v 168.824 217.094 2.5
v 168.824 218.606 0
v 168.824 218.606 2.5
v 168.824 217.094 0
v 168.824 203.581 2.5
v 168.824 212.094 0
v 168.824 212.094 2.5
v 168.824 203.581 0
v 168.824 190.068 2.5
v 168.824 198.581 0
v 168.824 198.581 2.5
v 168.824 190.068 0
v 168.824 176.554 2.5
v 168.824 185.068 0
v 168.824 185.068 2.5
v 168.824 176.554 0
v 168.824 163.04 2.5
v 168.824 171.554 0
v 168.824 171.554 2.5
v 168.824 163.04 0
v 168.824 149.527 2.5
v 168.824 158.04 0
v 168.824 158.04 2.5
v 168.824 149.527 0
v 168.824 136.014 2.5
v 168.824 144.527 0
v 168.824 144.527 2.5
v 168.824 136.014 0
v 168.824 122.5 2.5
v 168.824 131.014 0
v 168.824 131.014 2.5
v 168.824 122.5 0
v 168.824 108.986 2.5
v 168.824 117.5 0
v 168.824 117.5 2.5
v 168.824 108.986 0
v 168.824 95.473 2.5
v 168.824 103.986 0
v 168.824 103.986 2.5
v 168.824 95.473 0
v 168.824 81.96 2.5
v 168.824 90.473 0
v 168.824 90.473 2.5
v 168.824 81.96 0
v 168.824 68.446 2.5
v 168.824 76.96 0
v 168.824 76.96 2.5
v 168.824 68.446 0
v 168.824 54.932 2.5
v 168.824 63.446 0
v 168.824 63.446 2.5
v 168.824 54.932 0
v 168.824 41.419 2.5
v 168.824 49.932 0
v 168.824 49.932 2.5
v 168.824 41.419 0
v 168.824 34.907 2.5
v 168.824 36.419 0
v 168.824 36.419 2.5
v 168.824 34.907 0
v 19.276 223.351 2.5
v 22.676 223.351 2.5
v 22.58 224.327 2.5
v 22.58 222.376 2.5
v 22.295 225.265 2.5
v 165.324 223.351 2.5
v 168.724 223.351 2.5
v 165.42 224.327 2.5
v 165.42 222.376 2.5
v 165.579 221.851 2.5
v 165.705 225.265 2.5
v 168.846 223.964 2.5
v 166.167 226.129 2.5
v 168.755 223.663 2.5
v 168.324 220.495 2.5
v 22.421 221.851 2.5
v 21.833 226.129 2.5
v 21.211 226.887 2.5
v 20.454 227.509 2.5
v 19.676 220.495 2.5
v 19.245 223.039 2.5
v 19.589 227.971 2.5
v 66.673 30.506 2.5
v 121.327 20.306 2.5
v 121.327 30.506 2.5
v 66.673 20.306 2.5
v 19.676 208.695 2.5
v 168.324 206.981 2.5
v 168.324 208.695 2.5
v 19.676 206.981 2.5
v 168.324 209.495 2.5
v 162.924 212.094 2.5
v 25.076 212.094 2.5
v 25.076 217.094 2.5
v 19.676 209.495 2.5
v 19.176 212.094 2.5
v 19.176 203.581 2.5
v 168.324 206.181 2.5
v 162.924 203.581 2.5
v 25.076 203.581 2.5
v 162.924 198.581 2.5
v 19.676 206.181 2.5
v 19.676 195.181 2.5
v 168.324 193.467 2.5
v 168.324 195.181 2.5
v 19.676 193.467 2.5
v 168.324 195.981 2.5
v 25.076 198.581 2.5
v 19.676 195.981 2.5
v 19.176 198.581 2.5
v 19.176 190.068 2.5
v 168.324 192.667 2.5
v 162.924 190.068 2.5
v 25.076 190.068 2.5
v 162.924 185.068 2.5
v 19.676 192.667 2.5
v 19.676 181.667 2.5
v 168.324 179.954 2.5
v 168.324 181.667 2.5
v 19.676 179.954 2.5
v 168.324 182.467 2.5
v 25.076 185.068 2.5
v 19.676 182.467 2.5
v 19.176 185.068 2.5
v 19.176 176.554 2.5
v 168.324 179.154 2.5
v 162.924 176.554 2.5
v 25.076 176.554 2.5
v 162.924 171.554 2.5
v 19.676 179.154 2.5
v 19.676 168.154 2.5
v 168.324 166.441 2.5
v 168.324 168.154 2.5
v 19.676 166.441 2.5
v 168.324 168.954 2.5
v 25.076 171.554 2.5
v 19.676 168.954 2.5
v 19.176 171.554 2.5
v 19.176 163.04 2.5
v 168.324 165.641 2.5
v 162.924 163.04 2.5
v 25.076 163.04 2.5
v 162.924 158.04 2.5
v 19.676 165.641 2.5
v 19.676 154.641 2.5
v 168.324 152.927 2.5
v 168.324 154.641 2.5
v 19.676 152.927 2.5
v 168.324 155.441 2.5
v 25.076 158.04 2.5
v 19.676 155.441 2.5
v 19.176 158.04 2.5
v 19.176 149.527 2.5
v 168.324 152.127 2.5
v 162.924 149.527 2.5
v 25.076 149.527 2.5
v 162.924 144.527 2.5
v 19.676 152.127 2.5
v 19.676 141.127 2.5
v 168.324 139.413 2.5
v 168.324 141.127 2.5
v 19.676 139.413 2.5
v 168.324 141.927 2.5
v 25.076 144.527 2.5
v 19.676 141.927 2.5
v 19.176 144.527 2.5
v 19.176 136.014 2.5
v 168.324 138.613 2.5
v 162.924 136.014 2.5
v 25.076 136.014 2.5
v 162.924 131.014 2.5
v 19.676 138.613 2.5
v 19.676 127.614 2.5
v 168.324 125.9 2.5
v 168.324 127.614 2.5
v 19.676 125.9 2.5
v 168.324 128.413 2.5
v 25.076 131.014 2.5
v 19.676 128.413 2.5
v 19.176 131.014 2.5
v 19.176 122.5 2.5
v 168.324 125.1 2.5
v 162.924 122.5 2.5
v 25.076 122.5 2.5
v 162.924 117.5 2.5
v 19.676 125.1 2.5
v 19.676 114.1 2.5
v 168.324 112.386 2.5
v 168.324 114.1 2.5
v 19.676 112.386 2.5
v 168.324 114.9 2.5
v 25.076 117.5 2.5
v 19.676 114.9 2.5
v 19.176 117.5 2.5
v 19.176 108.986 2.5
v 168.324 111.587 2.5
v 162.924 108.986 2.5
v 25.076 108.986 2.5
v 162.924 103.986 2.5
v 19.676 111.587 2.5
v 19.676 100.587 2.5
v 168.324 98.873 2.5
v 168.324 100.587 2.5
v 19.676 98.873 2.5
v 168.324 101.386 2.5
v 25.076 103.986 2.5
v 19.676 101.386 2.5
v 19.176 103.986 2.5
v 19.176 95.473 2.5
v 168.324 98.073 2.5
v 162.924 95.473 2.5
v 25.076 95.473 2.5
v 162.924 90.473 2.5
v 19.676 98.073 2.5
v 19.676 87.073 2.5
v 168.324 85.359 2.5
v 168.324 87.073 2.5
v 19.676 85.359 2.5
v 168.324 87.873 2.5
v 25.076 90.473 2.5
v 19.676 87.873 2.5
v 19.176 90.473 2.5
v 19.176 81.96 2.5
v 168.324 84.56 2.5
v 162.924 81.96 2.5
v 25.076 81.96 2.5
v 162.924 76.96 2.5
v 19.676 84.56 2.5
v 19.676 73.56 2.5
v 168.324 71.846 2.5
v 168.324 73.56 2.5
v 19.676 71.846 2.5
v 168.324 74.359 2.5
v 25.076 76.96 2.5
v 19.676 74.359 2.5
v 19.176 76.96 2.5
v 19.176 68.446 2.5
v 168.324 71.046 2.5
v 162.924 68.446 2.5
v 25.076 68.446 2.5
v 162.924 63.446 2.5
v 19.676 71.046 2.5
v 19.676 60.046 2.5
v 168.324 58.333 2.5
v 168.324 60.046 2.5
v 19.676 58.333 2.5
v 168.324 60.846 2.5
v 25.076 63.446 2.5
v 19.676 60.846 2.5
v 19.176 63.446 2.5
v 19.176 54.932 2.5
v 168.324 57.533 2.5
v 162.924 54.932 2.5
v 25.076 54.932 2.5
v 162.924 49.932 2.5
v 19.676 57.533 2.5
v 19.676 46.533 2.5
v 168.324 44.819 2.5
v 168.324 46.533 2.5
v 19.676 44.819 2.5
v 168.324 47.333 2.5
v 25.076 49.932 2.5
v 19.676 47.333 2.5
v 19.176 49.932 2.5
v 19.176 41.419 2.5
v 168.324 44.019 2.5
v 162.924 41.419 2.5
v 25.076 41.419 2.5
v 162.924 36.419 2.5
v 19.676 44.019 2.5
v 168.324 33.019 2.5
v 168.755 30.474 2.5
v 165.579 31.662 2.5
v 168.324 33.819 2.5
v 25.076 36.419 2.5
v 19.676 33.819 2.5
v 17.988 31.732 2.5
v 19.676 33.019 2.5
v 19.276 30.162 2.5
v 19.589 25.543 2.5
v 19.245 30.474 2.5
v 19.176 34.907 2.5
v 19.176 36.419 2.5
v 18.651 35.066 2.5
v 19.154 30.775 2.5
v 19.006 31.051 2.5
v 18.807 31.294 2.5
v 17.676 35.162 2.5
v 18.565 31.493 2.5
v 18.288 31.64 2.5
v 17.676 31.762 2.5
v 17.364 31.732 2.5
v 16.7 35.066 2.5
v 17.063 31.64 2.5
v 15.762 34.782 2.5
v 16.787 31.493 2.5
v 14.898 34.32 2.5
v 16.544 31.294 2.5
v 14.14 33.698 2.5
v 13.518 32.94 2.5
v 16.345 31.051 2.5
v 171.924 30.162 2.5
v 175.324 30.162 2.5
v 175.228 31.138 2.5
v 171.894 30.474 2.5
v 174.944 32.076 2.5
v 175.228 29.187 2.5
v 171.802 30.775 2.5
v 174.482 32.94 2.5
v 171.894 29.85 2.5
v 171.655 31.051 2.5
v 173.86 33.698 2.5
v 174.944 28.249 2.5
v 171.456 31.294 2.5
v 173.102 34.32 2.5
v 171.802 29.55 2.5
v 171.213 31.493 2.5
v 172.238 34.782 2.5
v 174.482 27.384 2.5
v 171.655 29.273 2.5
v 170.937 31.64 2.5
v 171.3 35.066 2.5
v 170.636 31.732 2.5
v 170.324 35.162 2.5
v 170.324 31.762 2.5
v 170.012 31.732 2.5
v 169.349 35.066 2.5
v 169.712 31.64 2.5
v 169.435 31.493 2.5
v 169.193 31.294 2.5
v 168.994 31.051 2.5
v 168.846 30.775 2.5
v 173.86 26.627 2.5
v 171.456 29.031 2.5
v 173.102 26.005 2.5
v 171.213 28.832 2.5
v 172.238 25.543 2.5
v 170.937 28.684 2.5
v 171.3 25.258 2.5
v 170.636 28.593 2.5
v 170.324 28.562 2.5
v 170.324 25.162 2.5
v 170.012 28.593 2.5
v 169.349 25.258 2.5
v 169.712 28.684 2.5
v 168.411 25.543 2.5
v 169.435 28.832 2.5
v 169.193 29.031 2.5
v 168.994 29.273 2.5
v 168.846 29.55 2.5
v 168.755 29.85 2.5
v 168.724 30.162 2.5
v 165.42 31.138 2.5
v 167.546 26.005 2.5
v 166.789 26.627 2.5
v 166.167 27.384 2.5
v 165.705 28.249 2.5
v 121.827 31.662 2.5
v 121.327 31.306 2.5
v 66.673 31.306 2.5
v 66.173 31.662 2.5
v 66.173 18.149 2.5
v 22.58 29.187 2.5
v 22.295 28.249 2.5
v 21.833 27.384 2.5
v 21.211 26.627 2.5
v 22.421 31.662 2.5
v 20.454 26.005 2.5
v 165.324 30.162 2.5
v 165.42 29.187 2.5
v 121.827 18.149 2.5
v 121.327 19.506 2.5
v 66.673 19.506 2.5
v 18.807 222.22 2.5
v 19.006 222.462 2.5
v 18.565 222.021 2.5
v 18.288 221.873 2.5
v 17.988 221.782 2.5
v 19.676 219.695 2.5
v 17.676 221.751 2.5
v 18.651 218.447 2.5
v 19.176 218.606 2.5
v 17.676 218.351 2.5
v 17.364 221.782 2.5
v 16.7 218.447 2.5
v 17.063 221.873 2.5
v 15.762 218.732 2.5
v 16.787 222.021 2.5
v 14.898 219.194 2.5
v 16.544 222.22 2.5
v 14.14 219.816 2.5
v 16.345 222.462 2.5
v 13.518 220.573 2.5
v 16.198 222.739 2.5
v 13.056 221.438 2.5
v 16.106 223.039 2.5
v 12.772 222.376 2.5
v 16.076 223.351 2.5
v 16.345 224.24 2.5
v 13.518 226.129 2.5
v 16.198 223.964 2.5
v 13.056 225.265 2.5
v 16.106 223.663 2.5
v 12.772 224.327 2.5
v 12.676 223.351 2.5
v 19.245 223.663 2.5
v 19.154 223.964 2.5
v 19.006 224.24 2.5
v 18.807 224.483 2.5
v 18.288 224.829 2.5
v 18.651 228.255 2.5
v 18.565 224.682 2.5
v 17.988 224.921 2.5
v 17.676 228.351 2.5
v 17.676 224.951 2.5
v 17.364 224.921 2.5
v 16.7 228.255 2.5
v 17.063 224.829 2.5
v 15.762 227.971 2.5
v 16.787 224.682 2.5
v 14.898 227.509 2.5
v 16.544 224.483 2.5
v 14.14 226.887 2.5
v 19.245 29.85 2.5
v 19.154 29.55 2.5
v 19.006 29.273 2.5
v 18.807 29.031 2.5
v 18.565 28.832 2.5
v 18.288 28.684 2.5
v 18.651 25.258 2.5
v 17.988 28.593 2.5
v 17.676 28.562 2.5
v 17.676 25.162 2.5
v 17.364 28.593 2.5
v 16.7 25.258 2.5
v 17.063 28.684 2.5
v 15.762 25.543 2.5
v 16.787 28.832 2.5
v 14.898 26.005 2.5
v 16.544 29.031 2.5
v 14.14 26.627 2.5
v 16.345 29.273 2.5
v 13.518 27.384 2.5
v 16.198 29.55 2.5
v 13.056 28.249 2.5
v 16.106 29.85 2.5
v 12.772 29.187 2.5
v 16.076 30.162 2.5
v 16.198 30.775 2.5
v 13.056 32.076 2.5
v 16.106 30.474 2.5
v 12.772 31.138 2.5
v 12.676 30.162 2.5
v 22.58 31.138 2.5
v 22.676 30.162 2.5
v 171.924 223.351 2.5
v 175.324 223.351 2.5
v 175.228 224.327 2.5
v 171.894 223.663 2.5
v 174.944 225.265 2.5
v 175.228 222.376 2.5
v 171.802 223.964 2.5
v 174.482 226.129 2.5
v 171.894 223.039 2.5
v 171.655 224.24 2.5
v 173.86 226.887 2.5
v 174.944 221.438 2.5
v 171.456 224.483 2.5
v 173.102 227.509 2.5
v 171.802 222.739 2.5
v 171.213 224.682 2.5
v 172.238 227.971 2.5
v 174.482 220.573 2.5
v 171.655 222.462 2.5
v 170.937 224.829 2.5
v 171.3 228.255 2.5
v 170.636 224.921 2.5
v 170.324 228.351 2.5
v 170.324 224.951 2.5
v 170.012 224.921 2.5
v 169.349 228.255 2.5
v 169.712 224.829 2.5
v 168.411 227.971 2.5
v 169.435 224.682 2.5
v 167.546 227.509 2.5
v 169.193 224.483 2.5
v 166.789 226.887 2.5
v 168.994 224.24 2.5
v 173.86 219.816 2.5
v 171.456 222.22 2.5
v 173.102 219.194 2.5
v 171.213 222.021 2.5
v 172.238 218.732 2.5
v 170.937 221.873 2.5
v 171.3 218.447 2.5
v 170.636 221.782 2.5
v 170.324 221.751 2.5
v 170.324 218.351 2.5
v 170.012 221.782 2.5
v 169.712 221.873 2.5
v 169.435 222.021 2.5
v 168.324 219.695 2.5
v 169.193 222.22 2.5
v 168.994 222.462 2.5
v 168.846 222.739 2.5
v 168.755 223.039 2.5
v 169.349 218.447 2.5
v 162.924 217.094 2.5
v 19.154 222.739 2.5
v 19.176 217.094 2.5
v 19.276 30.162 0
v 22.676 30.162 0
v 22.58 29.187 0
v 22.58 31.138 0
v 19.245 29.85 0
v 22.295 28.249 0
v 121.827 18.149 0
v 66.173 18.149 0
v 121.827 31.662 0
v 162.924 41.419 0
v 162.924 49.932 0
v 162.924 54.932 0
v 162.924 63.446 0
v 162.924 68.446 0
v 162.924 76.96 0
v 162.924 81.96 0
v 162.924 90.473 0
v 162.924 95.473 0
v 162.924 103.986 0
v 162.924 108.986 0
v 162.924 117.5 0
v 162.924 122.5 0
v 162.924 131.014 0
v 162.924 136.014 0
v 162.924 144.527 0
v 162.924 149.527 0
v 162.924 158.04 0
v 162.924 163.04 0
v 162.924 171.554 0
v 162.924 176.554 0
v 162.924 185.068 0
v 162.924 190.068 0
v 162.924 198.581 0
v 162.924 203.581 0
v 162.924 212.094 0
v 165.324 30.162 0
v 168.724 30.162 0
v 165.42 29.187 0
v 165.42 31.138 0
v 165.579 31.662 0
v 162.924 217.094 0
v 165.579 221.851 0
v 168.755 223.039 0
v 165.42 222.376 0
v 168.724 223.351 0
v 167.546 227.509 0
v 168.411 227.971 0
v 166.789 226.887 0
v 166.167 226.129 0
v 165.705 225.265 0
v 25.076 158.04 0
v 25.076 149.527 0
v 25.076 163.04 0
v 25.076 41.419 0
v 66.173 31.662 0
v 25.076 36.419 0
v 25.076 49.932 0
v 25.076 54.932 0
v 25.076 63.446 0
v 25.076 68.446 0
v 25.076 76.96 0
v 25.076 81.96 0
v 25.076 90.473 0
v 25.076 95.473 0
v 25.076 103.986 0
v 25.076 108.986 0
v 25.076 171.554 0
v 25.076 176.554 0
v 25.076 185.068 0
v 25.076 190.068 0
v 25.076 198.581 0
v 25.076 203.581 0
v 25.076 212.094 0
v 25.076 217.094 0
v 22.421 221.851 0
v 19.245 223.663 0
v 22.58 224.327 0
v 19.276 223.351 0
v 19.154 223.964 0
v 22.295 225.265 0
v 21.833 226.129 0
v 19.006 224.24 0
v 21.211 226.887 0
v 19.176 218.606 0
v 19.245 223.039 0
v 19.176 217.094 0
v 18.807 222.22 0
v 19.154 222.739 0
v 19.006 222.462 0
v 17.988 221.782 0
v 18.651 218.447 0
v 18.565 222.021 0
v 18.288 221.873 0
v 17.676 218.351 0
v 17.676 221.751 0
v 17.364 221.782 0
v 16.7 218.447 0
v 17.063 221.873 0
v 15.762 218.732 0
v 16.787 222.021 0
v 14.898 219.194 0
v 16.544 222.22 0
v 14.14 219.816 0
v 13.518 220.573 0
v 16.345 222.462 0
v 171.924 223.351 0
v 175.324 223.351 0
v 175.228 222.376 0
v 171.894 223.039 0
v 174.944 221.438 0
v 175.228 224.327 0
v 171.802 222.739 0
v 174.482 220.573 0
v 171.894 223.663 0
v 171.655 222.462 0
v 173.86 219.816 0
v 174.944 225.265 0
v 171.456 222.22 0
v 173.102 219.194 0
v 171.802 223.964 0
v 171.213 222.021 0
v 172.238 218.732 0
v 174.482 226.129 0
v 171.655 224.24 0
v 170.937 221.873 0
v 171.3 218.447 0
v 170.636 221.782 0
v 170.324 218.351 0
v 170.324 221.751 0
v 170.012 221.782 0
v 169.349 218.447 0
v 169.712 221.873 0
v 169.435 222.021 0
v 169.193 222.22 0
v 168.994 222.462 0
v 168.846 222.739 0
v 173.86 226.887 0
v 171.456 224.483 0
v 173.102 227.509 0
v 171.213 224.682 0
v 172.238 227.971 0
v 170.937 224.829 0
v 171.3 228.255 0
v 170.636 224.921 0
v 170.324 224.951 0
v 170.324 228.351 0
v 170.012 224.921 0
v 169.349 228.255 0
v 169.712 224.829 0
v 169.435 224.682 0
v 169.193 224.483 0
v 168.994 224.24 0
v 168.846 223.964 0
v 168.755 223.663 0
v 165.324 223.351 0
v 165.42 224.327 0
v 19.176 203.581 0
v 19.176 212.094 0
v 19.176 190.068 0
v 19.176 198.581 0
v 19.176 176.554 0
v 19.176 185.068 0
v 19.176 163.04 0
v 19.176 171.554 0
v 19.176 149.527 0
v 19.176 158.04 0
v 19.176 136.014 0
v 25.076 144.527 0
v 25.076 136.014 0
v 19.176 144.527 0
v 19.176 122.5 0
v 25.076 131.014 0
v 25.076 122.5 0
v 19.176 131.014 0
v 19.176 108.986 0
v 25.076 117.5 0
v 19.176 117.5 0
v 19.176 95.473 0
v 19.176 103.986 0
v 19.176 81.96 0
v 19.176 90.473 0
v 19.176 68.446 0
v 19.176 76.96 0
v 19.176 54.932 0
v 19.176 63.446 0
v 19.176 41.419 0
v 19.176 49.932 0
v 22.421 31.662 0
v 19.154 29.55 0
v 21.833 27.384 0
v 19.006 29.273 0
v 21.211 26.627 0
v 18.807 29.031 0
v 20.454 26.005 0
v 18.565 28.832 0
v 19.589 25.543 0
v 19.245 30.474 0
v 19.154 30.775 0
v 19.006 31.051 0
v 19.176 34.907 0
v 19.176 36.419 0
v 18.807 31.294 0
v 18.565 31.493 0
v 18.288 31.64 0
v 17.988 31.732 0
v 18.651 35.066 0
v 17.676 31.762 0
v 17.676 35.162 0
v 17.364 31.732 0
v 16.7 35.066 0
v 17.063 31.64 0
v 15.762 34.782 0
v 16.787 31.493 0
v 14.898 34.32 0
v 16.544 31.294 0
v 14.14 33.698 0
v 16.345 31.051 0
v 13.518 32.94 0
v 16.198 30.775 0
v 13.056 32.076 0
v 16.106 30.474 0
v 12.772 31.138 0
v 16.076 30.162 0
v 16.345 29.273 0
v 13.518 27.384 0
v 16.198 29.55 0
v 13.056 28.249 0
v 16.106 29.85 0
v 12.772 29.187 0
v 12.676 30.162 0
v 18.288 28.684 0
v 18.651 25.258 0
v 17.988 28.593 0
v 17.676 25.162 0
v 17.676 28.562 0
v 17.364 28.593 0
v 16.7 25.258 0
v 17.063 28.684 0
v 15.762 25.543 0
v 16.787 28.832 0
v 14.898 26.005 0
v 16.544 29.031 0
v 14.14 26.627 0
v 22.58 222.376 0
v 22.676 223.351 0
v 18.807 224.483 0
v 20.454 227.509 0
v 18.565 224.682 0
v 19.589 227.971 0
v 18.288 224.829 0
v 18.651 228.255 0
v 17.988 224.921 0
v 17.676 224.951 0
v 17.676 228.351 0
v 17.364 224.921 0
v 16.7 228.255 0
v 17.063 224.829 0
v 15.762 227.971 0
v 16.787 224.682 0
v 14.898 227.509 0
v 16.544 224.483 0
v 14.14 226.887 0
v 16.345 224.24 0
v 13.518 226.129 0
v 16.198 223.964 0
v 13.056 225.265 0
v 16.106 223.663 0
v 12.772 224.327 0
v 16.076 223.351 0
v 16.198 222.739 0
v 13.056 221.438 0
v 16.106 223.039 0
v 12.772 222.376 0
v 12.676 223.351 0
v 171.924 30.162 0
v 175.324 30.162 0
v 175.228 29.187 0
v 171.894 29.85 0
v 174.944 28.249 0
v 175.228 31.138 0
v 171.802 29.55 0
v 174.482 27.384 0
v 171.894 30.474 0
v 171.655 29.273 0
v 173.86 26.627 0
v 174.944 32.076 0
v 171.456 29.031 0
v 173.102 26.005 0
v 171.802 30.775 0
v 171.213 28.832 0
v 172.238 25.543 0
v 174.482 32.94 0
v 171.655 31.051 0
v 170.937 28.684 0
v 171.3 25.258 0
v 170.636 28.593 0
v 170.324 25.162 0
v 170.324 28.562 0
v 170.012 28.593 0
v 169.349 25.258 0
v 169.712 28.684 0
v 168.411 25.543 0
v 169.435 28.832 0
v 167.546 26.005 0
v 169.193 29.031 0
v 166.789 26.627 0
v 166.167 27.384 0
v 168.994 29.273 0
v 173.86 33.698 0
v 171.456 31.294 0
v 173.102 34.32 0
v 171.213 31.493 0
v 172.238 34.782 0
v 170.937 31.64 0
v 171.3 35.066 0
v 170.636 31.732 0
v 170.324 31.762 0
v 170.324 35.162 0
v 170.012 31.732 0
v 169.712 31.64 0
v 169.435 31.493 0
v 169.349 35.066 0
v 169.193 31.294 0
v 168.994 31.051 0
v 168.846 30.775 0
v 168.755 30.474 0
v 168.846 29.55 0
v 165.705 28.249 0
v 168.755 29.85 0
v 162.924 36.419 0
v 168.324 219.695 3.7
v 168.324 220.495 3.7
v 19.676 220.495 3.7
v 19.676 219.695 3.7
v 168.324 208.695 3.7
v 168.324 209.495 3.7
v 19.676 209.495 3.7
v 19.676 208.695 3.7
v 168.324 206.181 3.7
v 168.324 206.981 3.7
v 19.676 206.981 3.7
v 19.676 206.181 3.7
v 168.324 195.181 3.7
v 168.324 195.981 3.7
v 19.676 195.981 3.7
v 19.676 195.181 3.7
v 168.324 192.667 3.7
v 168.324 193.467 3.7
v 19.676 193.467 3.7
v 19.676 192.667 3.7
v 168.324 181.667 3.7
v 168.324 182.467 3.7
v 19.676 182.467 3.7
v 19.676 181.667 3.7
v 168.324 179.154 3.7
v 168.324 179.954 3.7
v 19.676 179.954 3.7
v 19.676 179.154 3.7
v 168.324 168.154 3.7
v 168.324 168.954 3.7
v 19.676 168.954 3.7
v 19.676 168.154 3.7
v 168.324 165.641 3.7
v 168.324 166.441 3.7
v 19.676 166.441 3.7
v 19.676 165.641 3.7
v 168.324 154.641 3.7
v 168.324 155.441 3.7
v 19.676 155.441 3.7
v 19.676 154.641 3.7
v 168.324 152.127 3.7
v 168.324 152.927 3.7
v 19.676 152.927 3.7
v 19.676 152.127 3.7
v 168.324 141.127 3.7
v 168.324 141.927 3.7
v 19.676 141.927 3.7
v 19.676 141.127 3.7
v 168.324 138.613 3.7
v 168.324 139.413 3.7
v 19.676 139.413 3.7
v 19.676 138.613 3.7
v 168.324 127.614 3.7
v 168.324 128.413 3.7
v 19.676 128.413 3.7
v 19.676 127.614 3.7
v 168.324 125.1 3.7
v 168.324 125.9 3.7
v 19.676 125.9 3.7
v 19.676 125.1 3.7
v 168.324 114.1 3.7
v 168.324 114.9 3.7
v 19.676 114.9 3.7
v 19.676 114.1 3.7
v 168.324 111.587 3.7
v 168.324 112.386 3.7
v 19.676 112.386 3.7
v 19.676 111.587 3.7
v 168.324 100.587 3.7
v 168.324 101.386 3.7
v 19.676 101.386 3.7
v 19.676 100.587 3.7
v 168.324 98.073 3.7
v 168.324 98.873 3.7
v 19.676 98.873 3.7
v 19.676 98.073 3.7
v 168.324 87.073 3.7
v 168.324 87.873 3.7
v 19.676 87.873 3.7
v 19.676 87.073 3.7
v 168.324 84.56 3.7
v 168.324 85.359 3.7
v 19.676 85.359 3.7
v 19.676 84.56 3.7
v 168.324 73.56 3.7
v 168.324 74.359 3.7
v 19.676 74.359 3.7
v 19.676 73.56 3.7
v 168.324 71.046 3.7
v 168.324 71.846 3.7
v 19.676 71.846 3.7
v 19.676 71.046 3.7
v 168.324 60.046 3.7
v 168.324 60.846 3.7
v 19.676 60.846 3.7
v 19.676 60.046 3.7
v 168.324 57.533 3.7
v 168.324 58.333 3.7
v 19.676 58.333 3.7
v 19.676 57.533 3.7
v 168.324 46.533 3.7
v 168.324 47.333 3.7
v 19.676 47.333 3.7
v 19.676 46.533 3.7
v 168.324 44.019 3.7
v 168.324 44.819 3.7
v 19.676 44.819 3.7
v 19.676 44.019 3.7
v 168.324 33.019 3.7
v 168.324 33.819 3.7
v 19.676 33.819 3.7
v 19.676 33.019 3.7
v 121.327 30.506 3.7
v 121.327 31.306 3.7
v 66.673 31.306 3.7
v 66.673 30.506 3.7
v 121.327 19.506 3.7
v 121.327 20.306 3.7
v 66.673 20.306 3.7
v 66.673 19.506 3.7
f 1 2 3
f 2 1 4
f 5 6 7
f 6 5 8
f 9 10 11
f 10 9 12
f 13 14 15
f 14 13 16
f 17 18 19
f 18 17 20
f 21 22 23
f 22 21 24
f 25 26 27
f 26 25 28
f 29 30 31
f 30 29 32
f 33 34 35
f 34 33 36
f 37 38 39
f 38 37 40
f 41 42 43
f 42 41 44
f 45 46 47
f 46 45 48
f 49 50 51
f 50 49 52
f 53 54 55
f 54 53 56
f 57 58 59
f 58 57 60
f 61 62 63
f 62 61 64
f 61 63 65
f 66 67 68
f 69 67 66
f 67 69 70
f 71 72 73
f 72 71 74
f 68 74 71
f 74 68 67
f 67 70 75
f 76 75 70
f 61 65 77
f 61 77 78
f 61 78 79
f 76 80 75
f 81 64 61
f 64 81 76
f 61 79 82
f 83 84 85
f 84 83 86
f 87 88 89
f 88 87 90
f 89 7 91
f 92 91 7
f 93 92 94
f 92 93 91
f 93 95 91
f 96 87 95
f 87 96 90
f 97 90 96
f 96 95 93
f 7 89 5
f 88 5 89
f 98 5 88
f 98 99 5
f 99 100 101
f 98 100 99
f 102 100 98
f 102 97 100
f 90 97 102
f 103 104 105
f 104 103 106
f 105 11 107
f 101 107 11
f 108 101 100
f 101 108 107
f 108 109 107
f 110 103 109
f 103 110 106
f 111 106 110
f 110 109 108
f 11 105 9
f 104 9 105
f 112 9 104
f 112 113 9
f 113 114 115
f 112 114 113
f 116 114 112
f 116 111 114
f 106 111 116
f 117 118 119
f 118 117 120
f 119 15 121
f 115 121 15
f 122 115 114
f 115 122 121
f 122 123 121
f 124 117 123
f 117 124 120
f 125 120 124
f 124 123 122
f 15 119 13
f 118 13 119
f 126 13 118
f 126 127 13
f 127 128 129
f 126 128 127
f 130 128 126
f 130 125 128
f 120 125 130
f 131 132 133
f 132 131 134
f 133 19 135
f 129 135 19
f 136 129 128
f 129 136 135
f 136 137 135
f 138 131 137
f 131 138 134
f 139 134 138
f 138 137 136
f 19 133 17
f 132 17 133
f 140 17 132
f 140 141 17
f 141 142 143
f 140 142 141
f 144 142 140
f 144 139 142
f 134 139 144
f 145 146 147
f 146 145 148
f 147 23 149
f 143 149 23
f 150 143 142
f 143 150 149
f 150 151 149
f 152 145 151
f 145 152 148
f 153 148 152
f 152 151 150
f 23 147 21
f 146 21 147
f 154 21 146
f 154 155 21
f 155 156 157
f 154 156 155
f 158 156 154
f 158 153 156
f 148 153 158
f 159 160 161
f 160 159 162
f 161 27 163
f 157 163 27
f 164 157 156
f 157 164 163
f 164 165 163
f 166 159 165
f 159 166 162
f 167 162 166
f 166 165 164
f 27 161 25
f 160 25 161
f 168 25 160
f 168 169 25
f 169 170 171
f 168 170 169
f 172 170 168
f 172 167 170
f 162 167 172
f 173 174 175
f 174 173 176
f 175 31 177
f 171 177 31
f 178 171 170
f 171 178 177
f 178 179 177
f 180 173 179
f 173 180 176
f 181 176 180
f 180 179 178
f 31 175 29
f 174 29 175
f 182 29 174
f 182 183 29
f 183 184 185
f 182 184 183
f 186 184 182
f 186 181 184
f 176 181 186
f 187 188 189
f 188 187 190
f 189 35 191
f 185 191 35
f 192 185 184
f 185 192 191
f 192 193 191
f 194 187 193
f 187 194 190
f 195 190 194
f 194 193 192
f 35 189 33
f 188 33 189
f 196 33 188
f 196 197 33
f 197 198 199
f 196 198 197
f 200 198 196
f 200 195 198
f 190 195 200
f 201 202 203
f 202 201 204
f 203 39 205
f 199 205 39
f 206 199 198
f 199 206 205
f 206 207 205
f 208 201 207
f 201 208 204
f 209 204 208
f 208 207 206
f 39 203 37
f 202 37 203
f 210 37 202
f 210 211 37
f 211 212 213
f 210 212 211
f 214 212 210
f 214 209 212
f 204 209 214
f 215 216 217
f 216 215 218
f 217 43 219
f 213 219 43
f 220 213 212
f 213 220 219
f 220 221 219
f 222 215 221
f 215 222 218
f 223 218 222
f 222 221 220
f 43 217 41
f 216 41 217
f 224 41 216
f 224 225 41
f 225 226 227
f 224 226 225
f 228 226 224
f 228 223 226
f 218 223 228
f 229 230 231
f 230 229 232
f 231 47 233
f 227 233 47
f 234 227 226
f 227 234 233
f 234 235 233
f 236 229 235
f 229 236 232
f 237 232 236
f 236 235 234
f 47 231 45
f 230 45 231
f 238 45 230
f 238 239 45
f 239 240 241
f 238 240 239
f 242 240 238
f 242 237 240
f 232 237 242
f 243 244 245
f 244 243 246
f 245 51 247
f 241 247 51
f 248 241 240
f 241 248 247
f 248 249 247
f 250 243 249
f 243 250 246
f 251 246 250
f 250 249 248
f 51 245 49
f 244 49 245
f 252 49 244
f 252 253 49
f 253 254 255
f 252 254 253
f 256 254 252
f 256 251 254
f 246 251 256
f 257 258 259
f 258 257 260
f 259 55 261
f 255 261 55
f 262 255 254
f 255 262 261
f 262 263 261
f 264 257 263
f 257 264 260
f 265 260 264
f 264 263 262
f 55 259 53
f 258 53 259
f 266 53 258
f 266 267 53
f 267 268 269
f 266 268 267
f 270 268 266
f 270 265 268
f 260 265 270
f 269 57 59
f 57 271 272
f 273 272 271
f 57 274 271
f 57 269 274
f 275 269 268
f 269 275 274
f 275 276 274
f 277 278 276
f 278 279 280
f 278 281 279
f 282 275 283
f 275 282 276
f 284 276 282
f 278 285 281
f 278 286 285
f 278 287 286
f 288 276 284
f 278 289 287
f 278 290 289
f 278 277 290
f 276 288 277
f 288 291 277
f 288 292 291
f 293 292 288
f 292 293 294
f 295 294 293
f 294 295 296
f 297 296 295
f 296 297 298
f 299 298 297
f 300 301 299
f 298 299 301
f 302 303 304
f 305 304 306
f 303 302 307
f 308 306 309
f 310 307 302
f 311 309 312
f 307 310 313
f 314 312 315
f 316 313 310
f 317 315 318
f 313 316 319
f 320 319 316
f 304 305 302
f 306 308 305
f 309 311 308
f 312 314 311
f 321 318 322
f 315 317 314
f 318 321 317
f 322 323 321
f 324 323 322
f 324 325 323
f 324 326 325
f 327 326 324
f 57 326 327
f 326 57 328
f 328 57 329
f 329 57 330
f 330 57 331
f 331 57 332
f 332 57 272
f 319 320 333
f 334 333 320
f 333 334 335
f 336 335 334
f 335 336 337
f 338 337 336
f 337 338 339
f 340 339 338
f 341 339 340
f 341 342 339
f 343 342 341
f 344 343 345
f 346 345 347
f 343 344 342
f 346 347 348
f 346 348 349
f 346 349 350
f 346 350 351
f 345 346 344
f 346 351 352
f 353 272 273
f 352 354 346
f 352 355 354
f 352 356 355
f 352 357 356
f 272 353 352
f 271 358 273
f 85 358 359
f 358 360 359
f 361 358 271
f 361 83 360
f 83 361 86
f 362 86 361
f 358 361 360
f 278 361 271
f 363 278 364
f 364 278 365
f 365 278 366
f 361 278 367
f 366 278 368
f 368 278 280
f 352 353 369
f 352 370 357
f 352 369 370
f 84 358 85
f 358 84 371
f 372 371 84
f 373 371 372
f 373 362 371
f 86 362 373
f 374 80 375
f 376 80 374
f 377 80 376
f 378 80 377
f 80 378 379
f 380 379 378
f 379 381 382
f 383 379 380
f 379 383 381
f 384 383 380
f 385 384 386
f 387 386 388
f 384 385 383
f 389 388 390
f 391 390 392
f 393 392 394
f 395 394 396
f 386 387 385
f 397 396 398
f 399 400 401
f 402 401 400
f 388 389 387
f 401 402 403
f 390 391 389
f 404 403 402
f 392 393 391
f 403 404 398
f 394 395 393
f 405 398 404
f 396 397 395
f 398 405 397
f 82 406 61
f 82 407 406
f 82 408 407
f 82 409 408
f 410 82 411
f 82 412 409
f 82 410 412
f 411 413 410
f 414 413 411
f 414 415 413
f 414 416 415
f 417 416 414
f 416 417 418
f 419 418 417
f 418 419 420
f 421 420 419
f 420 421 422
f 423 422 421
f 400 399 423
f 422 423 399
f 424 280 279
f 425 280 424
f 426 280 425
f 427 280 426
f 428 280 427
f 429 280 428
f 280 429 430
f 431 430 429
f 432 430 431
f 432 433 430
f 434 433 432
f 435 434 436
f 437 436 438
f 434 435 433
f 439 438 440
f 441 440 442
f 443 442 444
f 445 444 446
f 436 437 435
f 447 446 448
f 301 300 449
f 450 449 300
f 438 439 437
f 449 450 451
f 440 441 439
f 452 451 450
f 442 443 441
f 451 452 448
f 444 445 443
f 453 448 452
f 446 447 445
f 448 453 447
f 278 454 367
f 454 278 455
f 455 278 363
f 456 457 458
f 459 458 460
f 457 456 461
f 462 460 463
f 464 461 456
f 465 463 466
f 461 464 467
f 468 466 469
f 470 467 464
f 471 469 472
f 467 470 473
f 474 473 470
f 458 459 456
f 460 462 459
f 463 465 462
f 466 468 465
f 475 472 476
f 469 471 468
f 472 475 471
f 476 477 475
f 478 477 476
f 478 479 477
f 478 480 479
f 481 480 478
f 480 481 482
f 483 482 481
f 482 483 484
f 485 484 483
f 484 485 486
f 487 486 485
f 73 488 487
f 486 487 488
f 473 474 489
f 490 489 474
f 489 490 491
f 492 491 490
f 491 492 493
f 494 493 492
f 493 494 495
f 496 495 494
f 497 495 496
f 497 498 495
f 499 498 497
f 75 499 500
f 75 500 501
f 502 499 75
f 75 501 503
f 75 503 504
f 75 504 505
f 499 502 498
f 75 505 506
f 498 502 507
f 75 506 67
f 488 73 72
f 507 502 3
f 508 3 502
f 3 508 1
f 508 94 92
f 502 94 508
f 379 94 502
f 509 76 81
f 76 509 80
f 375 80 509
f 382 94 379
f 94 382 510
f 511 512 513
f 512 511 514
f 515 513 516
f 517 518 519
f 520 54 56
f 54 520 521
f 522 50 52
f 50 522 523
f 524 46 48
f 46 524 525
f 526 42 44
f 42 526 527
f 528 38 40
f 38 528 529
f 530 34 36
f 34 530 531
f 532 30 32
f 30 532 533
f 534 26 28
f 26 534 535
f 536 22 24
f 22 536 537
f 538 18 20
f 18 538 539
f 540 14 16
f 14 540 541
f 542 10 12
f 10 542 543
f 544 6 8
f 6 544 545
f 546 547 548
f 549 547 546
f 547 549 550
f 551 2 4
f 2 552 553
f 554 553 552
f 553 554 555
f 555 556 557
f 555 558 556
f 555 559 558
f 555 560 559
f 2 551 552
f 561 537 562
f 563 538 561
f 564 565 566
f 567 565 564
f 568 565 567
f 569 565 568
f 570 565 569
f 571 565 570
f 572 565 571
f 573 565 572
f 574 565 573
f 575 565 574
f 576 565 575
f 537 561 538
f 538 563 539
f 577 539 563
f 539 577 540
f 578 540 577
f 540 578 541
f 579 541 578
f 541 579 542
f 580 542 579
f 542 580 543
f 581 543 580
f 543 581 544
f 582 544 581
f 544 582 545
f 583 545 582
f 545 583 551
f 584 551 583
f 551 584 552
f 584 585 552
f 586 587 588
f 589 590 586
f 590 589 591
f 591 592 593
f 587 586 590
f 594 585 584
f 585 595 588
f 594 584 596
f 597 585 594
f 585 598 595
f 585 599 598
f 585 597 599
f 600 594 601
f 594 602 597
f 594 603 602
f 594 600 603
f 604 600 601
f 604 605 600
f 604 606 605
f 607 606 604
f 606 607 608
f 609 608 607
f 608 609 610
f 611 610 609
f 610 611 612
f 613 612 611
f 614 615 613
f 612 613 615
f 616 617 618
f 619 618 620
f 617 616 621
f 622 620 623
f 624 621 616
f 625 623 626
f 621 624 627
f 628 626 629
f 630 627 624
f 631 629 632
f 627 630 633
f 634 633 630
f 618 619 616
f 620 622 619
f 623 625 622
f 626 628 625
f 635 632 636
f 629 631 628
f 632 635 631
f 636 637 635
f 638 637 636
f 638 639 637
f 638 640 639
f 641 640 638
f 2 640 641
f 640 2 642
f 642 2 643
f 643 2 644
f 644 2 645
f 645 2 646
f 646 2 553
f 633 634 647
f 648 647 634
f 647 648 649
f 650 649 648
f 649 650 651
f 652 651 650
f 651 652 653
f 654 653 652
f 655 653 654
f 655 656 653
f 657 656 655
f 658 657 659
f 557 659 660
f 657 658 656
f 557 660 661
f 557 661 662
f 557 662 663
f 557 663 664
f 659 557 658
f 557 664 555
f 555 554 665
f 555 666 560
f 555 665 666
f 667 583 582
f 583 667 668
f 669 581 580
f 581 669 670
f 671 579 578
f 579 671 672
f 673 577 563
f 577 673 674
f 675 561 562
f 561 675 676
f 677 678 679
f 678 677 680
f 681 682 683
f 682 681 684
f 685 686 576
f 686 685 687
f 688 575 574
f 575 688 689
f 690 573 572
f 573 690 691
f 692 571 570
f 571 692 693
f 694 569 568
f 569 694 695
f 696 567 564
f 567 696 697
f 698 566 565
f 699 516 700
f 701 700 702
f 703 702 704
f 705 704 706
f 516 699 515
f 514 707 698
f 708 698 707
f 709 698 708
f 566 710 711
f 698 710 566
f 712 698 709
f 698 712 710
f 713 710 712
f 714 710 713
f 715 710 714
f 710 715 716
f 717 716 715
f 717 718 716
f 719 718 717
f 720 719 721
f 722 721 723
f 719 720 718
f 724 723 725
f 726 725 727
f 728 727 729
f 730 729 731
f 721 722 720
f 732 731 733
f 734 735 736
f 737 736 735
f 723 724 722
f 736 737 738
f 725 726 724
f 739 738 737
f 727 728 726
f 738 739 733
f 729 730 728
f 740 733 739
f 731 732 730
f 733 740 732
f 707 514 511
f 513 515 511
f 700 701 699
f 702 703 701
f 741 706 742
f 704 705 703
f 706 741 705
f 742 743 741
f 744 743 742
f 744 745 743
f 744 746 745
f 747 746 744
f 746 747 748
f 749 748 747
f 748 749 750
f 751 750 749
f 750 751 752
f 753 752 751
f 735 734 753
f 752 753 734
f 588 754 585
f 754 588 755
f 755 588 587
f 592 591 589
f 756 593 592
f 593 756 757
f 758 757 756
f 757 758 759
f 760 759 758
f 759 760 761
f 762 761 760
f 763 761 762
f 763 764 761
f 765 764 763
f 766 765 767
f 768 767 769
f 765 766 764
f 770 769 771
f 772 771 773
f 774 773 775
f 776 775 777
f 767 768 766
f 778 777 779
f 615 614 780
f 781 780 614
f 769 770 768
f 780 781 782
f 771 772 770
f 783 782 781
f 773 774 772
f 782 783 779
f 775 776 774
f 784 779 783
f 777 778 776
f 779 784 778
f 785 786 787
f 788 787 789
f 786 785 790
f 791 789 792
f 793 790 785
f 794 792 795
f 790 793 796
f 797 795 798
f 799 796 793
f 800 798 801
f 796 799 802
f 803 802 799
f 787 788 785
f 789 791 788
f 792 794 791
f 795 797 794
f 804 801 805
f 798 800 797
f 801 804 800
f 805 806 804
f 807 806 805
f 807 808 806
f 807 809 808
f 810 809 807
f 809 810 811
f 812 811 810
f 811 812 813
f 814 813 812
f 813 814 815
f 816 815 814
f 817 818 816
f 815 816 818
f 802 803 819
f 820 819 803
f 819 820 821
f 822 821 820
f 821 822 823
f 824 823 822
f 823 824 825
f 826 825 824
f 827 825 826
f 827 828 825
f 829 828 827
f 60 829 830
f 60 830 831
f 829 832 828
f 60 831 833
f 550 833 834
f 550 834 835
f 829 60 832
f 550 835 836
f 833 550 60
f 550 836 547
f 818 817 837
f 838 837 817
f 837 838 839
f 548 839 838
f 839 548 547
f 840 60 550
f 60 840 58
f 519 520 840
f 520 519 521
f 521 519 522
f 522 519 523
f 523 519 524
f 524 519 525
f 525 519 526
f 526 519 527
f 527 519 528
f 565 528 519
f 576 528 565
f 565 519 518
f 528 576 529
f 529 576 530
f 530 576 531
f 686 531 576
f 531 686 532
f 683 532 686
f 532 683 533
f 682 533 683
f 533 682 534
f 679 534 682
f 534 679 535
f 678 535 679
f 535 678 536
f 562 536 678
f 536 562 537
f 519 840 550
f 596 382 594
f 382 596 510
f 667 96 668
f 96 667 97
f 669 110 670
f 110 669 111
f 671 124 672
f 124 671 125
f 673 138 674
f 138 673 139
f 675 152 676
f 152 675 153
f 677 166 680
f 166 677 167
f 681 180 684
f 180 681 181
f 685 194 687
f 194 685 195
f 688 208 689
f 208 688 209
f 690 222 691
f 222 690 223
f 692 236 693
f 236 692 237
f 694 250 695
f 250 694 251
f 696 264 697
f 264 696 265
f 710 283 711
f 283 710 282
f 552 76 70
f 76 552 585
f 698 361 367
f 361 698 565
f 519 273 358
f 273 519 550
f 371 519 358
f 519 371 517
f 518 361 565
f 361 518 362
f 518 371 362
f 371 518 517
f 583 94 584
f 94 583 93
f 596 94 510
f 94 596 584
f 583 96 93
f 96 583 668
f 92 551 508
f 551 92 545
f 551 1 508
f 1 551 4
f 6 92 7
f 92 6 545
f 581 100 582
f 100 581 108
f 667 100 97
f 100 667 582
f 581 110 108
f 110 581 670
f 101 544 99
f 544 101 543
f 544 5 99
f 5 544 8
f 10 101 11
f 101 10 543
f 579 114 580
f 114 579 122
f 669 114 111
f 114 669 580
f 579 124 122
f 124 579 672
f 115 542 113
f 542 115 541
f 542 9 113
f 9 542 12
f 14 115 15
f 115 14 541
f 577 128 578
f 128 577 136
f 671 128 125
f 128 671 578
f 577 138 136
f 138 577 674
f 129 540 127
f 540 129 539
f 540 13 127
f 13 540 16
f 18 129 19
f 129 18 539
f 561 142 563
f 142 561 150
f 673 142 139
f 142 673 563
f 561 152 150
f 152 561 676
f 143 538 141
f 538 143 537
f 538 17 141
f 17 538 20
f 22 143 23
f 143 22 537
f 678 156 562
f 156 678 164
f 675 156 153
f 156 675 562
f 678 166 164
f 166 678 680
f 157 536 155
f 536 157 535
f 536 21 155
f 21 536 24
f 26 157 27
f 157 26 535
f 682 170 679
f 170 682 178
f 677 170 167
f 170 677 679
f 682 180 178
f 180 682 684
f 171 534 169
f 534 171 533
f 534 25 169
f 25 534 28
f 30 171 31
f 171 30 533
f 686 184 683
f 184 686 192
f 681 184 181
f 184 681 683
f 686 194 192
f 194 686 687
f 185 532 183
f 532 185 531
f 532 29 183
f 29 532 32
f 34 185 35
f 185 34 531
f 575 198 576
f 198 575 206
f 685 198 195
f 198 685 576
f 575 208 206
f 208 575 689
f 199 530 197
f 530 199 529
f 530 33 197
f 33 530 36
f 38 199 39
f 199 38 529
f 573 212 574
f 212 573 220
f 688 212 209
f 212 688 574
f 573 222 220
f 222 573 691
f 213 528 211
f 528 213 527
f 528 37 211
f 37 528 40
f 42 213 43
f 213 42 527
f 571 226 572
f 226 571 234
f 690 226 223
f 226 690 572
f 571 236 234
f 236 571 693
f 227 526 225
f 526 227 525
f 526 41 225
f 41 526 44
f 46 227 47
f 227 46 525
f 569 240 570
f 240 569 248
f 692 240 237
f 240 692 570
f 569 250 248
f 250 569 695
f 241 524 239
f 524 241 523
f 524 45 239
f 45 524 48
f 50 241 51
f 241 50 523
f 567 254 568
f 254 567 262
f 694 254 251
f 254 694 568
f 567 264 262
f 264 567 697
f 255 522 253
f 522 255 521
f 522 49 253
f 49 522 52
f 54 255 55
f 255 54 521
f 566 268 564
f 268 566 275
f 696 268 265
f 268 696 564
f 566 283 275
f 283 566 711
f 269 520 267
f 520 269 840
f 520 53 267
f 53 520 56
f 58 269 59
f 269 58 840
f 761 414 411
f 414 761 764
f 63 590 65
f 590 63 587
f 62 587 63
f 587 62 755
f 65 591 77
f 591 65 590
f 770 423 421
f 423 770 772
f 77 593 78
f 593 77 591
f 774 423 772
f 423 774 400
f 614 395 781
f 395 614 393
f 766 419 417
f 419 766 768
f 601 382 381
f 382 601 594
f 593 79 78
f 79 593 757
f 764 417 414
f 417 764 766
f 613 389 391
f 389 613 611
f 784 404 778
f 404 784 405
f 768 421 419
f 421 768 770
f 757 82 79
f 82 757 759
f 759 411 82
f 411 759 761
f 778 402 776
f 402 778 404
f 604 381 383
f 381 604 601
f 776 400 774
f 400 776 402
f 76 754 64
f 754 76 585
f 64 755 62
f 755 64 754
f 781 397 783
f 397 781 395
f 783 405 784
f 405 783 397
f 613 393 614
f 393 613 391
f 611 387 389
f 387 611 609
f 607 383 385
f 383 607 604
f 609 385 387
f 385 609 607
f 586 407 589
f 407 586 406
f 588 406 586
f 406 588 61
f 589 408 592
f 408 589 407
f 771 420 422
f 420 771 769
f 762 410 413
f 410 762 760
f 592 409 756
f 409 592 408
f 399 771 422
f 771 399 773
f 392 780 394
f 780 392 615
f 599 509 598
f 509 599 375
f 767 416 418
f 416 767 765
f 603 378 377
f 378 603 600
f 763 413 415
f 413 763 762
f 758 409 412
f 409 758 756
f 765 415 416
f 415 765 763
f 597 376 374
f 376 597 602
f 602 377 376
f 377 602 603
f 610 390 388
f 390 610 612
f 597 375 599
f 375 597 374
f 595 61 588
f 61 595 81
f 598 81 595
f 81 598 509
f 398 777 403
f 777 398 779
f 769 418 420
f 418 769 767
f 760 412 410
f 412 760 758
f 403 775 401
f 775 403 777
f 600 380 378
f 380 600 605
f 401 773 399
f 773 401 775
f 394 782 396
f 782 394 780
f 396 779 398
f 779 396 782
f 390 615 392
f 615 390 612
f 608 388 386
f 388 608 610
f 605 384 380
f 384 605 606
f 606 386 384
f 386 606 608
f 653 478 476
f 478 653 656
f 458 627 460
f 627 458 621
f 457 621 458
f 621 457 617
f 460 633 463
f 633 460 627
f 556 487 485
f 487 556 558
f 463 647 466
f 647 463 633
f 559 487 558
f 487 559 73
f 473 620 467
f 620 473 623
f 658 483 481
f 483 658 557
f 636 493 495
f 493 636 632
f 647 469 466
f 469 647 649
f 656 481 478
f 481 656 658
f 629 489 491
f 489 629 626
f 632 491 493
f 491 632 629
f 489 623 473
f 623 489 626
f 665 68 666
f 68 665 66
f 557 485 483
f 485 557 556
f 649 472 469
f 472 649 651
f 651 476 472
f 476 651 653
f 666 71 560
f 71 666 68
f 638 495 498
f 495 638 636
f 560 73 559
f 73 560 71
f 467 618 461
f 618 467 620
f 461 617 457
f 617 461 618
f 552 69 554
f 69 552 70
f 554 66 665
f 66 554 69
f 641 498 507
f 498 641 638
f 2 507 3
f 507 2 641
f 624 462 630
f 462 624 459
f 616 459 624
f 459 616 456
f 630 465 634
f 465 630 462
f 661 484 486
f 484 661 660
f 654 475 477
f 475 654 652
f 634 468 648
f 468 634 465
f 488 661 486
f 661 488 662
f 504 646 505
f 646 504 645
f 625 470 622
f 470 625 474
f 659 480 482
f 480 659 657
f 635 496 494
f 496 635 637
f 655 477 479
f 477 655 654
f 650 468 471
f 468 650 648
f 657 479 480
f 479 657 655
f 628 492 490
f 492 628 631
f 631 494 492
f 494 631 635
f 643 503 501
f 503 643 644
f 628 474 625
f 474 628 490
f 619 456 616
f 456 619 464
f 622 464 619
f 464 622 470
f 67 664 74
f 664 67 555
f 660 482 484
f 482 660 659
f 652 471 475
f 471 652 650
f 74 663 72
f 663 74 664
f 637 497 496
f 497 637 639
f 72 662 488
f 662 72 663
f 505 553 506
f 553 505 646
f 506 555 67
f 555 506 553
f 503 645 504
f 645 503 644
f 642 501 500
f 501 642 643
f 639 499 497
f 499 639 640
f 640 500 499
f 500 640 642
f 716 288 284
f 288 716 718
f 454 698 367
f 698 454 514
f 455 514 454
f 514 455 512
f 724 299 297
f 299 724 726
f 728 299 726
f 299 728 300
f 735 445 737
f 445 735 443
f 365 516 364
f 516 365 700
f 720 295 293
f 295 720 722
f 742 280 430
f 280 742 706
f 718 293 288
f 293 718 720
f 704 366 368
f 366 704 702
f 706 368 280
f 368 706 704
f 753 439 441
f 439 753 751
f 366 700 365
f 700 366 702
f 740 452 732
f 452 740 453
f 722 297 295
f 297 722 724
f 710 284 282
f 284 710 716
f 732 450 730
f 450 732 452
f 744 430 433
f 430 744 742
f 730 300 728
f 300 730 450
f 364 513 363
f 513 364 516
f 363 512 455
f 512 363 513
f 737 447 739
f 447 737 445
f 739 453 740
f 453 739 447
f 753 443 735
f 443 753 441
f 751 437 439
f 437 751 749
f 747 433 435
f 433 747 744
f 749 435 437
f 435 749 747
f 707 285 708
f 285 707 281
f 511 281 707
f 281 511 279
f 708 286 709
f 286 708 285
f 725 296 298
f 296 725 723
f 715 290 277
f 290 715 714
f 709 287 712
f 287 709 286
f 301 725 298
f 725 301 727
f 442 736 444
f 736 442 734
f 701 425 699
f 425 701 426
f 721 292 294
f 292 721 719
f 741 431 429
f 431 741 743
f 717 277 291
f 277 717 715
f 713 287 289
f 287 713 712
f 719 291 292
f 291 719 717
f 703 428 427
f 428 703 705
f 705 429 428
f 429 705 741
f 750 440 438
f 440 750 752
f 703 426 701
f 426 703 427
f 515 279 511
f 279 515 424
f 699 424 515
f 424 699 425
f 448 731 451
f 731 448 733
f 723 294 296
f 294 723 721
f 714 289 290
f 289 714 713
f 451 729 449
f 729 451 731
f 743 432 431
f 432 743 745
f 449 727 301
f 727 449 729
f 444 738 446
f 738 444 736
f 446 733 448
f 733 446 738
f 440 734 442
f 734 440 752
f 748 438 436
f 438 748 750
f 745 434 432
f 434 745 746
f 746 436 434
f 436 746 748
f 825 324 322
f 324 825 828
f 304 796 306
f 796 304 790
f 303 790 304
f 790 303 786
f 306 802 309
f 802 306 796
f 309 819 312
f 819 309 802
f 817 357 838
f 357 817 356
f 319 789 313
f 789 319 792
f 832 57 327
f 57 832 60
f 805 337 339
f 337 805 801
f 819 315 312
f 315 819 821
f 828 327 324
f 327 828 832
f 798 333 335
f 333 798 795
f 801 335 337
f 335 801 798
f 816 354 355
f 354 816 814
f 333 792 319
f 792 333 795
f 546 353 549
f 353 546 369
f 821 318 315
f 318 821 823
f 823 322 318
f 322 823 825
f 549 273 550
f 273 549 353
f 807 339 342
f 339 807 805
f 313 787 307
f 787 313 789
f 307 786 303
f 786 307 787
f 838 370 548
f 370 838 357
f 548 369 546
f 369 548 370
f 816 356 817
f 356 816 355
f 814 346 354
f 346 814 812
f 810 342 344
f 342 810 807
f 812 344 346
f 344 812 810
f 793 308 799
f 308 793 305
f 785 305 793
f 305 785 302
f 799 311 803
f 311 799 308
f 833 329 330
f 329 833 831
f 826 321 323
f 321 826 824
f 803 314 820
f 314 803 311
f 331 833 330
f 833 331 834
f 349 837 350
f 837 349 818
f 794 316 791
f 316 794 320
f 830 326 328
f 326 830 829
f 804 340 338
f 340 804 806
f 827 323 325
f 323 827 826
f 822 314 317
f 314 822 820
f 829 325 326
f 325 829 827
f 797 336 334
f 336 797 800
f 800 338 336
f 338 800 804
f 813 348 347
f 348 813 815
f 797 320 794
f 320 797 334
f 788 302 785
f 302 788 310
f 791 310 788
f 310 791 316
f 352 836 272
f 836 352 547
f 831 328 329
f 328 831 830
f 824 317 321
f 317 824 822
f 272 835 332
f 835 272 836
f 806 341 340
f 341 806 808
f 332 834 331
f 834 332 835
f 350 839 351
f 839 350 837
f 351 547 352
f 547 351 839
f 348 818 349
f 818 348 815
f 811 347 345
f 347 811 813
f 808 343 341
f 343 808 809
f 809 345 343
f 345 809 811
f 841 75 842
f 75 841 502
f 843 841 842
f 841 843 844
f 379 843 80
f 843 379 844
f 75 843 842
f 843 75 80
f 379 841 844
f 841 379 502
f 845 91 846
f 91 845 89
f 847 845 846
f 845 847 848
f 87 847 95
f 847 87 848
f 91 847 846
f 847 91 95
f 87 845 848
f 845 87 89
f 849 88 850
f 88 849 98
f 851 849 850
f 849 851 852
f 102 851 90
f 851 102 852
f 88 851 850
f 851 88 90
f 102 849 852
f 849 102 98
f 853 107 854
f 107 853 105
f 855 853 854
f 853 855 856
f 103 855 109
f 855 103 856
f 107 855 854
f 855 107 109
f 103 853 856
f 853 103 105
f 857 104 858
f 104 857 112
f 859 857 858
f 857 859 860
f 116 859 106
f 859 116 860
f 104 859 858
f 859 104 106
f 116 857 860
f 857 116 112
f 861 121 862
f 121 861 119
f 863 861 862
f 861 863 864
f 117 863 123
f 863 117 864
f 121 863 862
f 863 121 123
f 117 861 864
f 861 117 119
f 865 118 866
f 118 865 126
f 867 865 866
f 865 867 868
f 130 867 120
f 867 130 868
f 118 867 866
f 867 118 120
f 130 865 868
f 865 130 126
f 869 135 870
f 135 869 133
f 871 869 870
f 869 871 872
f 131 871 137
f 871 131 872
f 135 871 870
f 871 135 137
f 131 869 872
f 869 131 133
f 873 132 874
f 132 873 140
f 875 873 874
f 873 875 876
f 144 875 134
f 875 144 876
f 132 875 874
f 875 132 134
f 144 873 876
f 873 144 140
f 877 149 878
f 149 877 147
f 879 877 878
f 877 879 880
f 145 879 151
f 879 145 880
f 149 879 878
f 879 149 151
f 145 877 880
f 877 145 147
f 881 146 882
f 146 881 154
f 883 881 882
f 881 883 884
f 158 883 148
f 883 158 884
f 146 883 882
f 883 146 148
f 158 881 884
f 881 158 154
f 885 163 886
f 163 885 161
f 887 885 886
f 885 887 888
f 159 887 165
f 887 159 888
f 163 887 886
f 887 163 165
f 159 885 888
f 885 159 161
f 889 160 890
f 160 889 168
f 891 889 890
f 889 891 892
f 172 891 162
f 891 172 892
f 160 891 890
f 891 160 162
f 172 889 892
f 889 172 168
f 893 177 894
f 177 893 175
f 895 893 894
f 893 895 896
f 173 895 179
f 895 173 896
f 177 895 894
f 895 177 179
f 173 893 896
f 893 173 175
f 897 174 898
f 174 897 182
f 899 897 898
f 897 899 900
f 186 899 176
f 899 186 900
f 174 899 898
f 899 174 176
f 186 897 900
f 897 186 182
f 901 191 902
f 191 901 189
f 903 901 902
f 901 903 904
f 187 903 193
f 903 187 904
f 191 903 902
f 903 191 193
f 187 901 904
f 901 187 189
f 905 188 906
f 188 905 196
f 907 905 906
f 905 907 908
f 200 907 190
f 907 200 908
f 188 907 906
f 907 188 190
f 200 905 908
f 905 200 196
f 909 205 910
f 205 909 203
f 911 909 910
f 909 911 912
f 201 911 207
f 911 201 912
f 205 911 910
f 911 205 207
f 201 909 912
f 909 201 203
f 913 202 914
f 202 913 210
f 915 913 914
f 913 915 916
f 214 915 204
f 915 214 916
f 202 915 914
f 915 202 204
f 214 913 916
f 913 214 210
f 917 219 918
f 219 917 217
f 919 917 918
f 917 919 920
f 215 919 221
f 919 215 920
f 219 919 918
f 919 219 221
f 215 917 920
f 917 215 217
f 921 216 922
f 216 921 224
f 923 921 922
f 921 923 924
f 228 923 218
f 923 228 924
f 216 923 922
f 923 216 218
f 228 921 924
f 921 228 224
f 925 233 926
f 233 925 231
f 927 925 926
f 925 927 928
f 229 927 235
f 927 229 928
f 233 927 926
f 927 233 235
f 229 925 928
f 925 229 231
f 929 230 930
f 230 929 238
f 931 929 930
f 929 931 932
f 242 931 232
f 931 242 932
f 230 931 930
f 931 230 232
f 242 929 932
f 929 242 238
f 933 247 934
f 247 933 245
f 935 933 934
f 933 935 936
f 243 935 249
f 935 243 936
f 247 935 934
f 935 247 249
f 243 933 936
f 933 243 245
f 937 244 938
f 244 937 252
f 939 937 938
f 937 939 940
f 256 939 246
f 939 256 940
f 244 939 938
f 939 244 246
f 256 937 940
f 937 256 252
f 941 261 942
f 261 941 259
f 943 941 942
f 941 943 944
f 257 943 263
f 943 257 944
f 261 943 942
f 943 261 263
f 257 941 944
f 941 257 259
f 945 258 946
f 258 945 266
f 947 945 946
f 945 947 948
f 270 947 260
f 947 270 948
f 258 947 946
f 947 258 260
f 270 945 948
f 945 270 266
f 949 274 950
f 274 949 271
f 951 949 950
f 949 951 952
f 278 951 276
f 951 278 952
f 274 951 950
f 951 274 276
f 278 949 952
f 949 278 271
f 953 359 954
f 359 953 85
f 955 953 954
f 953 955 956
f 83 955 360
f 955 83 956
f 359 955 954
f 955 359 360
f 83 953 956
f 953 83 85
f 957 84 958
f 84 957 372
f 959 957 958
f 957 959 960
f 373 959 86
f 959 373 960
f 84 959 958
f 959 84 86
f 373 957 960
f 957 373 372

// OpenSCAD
// ==============================================================================
// WORDCLOCK ESP32 - PIEZA 2: PLACA DE LEDS INTERMEDIA CON OREJAS DE FIJACIÓN
// Parametric OpenSCAD Model for Bambu Lab (256x256 mm build plate)
// High-Density LED Strip: WS2812B 74 LEDs/m (Pitch = 13.5135 mm)
// Flat back plate for 100% support-free printing flat on the bed.
// ==============================================================================

// --- Parameters ---
led_pitch   = 13.5135; // 74 LEDs/m
cols        = 11;
rows        = 14;

box_w       = 188.0;
box_h       = 240.0;
wall_thick  = 3.0;
baffle_wall = 1.6;

grid_w      = (cols - 1) * led_pitch; // ~135.14 mm
grid_h      = (rows - 1) * led_pitch; // ~175.68 mm

margin_x    = (box_w - grid_w) / 2;       // ~26.43 mm
margin_top  = (box_h - grid_h - led_pitch) / 2; // ~25.41 mm

dots_block_cols = 4;
dots_y          = box_h - margin_top - (14 * led_pitch);

// Dimensiones de la placa del texto
plate_left  = margin_x - (led_pitch / 2) - 0.5;
plate_right = margin_x + grid_w + (led_pitch / 2) + 0.5;
plate_top   = box_h - margin_top + (led_pitch / 2) + 0.5;
plate_bot   = box_h - margin_top - grid_h - (led_pitch / 2) - 0.5;

plate_w     = plate_right - plate_left;
plate_h     = plate_top - plate_bot;
plate_thick = 2.5;

strip_w     = 10.2; // Ancho de tira LED WS2812B (mm)

// Coordenadas de las 4 orejas/esquinas del Baffle
baffle_left  = margin_x - (led_pitch / 2) - 2.0;
baffle_right = margin_x + grid_w + (led_pitch / 2) + 2.0;
baffle_top   = box_h - margin_top + (led_pitch / 2) + 2.0;
baffle_bot   = box_h - margin_top - grid_h - (led_pitch / 2) - 2.0;

// --- Module: Oreja de Fijación con Orificio M3 ---
module mounting_ear() {
    difference() {
        cylinder(r = 5.0, h = plate_thick, $fn = 32);
        translate([0, 0, -0.1]) cylinder(r = 1.6, h = plate_thick + 0.2, $fn = 32);
    }
}

// --- Module: Placa de LEDs Completa (Cara TraseraPlana) ---
module wordclock_led_plate() {
    union() {
        difference() {
            union() {
                // a) Placa del Grid de Texto (11x14)
                translate([plate_left, plate_bot, 0]) {
                    cube([plate_w, plate_h, plate_thick]);
                }

                // b) Extensión para el Bloque de 4 Puntos de Minutos
                dots_plate_w = (dots_block_cols * led_pitch) + baffle_wall;
                dots_plate_x = margin_x + (3.0 * led_pitch) - (baffle_wall / 2);
                dots_plate_y = dots_y - (led_pitch / 2) - 0.5;
                dots_plate_h = (plate_bot - dots_plate_y) + 1.0;

                translate([dots_plate_x, dots_plate_y, 0]) {
                    cube([dots_plate_w, dots_plate_h, plate_thick]);
                }
            }

            // Pasacables para conexiones entre filas de LEDs (Muescas laterales)
            for (r = [0 : rows - 1]) {
                y_row = box_h - margin_top - (r * led_pitch);
                translate([plate_left - 0.1, y_row - 2.5, -0.1])          cube([6.0, 5.0, plate_thick + 0.2]);
                translate([plate_right - 5.9, y_row - 2.5, -0.1])         cube([6.0, 5.0, plate_thick + 0.2]);
            }
        }

        // 3. Las 4 OREJAS DE FIJACIÓN en las esquinas del Baffle
        translate([baffle_left, baffle_top, 0])   mounting_ear();
        translate([baffle_right, baffle_top, 0])  mounting_ear();
        translate([baffle_left, baffle_bot, 0])   mounting_ear();
        translate([baffle_right, baffle_bot, 0])  mounting_ear();

        // 4. Guías grabadas para pegado preciso de las tiras LED
        // a) 14 Filas de Texto
        for (r = [0 : rows - 1]) {
            y = box_h - margin_top - (r * led_pitch) - (strip_w / 2);
            text_rail_x   = margin_x - (led_pitch / 2);
            text_rail_len = (cols * led_pitch);
            
            translate([text_rail_x, y + strip_w, plate_thick]) cube([text_rail_len, 0.8, 1.2]);
            translate([text_rail_x, y - 0.8, plate_thick])     cube([text_rail_len, 0.8, 1.2]);
        }

        // b) Canaleta de los 4 Puntos de Minutos
        dots_rail_x   = margin_x + (3.0 * led_pitch) - (baffle_wall / 2) + 0.5;
        dots_rail_len = (dots_block_cols * led_pitch) + baffle_wall - 1.0;
        y_dots_strip  = dots_y - (strip_w / 2);

        translate([dots_rail_x, y_dots_strip + strip_w, plate_thick]) cube([dots_rail_len, 0.8, 1.2]);
        translate([dots_rail_x, y_dots_strip - 0.8, plate_thick])     cube([dots_rail_len, 0.8, 1.2]);
    }
}

// Generar modelo
wordclock_led_plate();
